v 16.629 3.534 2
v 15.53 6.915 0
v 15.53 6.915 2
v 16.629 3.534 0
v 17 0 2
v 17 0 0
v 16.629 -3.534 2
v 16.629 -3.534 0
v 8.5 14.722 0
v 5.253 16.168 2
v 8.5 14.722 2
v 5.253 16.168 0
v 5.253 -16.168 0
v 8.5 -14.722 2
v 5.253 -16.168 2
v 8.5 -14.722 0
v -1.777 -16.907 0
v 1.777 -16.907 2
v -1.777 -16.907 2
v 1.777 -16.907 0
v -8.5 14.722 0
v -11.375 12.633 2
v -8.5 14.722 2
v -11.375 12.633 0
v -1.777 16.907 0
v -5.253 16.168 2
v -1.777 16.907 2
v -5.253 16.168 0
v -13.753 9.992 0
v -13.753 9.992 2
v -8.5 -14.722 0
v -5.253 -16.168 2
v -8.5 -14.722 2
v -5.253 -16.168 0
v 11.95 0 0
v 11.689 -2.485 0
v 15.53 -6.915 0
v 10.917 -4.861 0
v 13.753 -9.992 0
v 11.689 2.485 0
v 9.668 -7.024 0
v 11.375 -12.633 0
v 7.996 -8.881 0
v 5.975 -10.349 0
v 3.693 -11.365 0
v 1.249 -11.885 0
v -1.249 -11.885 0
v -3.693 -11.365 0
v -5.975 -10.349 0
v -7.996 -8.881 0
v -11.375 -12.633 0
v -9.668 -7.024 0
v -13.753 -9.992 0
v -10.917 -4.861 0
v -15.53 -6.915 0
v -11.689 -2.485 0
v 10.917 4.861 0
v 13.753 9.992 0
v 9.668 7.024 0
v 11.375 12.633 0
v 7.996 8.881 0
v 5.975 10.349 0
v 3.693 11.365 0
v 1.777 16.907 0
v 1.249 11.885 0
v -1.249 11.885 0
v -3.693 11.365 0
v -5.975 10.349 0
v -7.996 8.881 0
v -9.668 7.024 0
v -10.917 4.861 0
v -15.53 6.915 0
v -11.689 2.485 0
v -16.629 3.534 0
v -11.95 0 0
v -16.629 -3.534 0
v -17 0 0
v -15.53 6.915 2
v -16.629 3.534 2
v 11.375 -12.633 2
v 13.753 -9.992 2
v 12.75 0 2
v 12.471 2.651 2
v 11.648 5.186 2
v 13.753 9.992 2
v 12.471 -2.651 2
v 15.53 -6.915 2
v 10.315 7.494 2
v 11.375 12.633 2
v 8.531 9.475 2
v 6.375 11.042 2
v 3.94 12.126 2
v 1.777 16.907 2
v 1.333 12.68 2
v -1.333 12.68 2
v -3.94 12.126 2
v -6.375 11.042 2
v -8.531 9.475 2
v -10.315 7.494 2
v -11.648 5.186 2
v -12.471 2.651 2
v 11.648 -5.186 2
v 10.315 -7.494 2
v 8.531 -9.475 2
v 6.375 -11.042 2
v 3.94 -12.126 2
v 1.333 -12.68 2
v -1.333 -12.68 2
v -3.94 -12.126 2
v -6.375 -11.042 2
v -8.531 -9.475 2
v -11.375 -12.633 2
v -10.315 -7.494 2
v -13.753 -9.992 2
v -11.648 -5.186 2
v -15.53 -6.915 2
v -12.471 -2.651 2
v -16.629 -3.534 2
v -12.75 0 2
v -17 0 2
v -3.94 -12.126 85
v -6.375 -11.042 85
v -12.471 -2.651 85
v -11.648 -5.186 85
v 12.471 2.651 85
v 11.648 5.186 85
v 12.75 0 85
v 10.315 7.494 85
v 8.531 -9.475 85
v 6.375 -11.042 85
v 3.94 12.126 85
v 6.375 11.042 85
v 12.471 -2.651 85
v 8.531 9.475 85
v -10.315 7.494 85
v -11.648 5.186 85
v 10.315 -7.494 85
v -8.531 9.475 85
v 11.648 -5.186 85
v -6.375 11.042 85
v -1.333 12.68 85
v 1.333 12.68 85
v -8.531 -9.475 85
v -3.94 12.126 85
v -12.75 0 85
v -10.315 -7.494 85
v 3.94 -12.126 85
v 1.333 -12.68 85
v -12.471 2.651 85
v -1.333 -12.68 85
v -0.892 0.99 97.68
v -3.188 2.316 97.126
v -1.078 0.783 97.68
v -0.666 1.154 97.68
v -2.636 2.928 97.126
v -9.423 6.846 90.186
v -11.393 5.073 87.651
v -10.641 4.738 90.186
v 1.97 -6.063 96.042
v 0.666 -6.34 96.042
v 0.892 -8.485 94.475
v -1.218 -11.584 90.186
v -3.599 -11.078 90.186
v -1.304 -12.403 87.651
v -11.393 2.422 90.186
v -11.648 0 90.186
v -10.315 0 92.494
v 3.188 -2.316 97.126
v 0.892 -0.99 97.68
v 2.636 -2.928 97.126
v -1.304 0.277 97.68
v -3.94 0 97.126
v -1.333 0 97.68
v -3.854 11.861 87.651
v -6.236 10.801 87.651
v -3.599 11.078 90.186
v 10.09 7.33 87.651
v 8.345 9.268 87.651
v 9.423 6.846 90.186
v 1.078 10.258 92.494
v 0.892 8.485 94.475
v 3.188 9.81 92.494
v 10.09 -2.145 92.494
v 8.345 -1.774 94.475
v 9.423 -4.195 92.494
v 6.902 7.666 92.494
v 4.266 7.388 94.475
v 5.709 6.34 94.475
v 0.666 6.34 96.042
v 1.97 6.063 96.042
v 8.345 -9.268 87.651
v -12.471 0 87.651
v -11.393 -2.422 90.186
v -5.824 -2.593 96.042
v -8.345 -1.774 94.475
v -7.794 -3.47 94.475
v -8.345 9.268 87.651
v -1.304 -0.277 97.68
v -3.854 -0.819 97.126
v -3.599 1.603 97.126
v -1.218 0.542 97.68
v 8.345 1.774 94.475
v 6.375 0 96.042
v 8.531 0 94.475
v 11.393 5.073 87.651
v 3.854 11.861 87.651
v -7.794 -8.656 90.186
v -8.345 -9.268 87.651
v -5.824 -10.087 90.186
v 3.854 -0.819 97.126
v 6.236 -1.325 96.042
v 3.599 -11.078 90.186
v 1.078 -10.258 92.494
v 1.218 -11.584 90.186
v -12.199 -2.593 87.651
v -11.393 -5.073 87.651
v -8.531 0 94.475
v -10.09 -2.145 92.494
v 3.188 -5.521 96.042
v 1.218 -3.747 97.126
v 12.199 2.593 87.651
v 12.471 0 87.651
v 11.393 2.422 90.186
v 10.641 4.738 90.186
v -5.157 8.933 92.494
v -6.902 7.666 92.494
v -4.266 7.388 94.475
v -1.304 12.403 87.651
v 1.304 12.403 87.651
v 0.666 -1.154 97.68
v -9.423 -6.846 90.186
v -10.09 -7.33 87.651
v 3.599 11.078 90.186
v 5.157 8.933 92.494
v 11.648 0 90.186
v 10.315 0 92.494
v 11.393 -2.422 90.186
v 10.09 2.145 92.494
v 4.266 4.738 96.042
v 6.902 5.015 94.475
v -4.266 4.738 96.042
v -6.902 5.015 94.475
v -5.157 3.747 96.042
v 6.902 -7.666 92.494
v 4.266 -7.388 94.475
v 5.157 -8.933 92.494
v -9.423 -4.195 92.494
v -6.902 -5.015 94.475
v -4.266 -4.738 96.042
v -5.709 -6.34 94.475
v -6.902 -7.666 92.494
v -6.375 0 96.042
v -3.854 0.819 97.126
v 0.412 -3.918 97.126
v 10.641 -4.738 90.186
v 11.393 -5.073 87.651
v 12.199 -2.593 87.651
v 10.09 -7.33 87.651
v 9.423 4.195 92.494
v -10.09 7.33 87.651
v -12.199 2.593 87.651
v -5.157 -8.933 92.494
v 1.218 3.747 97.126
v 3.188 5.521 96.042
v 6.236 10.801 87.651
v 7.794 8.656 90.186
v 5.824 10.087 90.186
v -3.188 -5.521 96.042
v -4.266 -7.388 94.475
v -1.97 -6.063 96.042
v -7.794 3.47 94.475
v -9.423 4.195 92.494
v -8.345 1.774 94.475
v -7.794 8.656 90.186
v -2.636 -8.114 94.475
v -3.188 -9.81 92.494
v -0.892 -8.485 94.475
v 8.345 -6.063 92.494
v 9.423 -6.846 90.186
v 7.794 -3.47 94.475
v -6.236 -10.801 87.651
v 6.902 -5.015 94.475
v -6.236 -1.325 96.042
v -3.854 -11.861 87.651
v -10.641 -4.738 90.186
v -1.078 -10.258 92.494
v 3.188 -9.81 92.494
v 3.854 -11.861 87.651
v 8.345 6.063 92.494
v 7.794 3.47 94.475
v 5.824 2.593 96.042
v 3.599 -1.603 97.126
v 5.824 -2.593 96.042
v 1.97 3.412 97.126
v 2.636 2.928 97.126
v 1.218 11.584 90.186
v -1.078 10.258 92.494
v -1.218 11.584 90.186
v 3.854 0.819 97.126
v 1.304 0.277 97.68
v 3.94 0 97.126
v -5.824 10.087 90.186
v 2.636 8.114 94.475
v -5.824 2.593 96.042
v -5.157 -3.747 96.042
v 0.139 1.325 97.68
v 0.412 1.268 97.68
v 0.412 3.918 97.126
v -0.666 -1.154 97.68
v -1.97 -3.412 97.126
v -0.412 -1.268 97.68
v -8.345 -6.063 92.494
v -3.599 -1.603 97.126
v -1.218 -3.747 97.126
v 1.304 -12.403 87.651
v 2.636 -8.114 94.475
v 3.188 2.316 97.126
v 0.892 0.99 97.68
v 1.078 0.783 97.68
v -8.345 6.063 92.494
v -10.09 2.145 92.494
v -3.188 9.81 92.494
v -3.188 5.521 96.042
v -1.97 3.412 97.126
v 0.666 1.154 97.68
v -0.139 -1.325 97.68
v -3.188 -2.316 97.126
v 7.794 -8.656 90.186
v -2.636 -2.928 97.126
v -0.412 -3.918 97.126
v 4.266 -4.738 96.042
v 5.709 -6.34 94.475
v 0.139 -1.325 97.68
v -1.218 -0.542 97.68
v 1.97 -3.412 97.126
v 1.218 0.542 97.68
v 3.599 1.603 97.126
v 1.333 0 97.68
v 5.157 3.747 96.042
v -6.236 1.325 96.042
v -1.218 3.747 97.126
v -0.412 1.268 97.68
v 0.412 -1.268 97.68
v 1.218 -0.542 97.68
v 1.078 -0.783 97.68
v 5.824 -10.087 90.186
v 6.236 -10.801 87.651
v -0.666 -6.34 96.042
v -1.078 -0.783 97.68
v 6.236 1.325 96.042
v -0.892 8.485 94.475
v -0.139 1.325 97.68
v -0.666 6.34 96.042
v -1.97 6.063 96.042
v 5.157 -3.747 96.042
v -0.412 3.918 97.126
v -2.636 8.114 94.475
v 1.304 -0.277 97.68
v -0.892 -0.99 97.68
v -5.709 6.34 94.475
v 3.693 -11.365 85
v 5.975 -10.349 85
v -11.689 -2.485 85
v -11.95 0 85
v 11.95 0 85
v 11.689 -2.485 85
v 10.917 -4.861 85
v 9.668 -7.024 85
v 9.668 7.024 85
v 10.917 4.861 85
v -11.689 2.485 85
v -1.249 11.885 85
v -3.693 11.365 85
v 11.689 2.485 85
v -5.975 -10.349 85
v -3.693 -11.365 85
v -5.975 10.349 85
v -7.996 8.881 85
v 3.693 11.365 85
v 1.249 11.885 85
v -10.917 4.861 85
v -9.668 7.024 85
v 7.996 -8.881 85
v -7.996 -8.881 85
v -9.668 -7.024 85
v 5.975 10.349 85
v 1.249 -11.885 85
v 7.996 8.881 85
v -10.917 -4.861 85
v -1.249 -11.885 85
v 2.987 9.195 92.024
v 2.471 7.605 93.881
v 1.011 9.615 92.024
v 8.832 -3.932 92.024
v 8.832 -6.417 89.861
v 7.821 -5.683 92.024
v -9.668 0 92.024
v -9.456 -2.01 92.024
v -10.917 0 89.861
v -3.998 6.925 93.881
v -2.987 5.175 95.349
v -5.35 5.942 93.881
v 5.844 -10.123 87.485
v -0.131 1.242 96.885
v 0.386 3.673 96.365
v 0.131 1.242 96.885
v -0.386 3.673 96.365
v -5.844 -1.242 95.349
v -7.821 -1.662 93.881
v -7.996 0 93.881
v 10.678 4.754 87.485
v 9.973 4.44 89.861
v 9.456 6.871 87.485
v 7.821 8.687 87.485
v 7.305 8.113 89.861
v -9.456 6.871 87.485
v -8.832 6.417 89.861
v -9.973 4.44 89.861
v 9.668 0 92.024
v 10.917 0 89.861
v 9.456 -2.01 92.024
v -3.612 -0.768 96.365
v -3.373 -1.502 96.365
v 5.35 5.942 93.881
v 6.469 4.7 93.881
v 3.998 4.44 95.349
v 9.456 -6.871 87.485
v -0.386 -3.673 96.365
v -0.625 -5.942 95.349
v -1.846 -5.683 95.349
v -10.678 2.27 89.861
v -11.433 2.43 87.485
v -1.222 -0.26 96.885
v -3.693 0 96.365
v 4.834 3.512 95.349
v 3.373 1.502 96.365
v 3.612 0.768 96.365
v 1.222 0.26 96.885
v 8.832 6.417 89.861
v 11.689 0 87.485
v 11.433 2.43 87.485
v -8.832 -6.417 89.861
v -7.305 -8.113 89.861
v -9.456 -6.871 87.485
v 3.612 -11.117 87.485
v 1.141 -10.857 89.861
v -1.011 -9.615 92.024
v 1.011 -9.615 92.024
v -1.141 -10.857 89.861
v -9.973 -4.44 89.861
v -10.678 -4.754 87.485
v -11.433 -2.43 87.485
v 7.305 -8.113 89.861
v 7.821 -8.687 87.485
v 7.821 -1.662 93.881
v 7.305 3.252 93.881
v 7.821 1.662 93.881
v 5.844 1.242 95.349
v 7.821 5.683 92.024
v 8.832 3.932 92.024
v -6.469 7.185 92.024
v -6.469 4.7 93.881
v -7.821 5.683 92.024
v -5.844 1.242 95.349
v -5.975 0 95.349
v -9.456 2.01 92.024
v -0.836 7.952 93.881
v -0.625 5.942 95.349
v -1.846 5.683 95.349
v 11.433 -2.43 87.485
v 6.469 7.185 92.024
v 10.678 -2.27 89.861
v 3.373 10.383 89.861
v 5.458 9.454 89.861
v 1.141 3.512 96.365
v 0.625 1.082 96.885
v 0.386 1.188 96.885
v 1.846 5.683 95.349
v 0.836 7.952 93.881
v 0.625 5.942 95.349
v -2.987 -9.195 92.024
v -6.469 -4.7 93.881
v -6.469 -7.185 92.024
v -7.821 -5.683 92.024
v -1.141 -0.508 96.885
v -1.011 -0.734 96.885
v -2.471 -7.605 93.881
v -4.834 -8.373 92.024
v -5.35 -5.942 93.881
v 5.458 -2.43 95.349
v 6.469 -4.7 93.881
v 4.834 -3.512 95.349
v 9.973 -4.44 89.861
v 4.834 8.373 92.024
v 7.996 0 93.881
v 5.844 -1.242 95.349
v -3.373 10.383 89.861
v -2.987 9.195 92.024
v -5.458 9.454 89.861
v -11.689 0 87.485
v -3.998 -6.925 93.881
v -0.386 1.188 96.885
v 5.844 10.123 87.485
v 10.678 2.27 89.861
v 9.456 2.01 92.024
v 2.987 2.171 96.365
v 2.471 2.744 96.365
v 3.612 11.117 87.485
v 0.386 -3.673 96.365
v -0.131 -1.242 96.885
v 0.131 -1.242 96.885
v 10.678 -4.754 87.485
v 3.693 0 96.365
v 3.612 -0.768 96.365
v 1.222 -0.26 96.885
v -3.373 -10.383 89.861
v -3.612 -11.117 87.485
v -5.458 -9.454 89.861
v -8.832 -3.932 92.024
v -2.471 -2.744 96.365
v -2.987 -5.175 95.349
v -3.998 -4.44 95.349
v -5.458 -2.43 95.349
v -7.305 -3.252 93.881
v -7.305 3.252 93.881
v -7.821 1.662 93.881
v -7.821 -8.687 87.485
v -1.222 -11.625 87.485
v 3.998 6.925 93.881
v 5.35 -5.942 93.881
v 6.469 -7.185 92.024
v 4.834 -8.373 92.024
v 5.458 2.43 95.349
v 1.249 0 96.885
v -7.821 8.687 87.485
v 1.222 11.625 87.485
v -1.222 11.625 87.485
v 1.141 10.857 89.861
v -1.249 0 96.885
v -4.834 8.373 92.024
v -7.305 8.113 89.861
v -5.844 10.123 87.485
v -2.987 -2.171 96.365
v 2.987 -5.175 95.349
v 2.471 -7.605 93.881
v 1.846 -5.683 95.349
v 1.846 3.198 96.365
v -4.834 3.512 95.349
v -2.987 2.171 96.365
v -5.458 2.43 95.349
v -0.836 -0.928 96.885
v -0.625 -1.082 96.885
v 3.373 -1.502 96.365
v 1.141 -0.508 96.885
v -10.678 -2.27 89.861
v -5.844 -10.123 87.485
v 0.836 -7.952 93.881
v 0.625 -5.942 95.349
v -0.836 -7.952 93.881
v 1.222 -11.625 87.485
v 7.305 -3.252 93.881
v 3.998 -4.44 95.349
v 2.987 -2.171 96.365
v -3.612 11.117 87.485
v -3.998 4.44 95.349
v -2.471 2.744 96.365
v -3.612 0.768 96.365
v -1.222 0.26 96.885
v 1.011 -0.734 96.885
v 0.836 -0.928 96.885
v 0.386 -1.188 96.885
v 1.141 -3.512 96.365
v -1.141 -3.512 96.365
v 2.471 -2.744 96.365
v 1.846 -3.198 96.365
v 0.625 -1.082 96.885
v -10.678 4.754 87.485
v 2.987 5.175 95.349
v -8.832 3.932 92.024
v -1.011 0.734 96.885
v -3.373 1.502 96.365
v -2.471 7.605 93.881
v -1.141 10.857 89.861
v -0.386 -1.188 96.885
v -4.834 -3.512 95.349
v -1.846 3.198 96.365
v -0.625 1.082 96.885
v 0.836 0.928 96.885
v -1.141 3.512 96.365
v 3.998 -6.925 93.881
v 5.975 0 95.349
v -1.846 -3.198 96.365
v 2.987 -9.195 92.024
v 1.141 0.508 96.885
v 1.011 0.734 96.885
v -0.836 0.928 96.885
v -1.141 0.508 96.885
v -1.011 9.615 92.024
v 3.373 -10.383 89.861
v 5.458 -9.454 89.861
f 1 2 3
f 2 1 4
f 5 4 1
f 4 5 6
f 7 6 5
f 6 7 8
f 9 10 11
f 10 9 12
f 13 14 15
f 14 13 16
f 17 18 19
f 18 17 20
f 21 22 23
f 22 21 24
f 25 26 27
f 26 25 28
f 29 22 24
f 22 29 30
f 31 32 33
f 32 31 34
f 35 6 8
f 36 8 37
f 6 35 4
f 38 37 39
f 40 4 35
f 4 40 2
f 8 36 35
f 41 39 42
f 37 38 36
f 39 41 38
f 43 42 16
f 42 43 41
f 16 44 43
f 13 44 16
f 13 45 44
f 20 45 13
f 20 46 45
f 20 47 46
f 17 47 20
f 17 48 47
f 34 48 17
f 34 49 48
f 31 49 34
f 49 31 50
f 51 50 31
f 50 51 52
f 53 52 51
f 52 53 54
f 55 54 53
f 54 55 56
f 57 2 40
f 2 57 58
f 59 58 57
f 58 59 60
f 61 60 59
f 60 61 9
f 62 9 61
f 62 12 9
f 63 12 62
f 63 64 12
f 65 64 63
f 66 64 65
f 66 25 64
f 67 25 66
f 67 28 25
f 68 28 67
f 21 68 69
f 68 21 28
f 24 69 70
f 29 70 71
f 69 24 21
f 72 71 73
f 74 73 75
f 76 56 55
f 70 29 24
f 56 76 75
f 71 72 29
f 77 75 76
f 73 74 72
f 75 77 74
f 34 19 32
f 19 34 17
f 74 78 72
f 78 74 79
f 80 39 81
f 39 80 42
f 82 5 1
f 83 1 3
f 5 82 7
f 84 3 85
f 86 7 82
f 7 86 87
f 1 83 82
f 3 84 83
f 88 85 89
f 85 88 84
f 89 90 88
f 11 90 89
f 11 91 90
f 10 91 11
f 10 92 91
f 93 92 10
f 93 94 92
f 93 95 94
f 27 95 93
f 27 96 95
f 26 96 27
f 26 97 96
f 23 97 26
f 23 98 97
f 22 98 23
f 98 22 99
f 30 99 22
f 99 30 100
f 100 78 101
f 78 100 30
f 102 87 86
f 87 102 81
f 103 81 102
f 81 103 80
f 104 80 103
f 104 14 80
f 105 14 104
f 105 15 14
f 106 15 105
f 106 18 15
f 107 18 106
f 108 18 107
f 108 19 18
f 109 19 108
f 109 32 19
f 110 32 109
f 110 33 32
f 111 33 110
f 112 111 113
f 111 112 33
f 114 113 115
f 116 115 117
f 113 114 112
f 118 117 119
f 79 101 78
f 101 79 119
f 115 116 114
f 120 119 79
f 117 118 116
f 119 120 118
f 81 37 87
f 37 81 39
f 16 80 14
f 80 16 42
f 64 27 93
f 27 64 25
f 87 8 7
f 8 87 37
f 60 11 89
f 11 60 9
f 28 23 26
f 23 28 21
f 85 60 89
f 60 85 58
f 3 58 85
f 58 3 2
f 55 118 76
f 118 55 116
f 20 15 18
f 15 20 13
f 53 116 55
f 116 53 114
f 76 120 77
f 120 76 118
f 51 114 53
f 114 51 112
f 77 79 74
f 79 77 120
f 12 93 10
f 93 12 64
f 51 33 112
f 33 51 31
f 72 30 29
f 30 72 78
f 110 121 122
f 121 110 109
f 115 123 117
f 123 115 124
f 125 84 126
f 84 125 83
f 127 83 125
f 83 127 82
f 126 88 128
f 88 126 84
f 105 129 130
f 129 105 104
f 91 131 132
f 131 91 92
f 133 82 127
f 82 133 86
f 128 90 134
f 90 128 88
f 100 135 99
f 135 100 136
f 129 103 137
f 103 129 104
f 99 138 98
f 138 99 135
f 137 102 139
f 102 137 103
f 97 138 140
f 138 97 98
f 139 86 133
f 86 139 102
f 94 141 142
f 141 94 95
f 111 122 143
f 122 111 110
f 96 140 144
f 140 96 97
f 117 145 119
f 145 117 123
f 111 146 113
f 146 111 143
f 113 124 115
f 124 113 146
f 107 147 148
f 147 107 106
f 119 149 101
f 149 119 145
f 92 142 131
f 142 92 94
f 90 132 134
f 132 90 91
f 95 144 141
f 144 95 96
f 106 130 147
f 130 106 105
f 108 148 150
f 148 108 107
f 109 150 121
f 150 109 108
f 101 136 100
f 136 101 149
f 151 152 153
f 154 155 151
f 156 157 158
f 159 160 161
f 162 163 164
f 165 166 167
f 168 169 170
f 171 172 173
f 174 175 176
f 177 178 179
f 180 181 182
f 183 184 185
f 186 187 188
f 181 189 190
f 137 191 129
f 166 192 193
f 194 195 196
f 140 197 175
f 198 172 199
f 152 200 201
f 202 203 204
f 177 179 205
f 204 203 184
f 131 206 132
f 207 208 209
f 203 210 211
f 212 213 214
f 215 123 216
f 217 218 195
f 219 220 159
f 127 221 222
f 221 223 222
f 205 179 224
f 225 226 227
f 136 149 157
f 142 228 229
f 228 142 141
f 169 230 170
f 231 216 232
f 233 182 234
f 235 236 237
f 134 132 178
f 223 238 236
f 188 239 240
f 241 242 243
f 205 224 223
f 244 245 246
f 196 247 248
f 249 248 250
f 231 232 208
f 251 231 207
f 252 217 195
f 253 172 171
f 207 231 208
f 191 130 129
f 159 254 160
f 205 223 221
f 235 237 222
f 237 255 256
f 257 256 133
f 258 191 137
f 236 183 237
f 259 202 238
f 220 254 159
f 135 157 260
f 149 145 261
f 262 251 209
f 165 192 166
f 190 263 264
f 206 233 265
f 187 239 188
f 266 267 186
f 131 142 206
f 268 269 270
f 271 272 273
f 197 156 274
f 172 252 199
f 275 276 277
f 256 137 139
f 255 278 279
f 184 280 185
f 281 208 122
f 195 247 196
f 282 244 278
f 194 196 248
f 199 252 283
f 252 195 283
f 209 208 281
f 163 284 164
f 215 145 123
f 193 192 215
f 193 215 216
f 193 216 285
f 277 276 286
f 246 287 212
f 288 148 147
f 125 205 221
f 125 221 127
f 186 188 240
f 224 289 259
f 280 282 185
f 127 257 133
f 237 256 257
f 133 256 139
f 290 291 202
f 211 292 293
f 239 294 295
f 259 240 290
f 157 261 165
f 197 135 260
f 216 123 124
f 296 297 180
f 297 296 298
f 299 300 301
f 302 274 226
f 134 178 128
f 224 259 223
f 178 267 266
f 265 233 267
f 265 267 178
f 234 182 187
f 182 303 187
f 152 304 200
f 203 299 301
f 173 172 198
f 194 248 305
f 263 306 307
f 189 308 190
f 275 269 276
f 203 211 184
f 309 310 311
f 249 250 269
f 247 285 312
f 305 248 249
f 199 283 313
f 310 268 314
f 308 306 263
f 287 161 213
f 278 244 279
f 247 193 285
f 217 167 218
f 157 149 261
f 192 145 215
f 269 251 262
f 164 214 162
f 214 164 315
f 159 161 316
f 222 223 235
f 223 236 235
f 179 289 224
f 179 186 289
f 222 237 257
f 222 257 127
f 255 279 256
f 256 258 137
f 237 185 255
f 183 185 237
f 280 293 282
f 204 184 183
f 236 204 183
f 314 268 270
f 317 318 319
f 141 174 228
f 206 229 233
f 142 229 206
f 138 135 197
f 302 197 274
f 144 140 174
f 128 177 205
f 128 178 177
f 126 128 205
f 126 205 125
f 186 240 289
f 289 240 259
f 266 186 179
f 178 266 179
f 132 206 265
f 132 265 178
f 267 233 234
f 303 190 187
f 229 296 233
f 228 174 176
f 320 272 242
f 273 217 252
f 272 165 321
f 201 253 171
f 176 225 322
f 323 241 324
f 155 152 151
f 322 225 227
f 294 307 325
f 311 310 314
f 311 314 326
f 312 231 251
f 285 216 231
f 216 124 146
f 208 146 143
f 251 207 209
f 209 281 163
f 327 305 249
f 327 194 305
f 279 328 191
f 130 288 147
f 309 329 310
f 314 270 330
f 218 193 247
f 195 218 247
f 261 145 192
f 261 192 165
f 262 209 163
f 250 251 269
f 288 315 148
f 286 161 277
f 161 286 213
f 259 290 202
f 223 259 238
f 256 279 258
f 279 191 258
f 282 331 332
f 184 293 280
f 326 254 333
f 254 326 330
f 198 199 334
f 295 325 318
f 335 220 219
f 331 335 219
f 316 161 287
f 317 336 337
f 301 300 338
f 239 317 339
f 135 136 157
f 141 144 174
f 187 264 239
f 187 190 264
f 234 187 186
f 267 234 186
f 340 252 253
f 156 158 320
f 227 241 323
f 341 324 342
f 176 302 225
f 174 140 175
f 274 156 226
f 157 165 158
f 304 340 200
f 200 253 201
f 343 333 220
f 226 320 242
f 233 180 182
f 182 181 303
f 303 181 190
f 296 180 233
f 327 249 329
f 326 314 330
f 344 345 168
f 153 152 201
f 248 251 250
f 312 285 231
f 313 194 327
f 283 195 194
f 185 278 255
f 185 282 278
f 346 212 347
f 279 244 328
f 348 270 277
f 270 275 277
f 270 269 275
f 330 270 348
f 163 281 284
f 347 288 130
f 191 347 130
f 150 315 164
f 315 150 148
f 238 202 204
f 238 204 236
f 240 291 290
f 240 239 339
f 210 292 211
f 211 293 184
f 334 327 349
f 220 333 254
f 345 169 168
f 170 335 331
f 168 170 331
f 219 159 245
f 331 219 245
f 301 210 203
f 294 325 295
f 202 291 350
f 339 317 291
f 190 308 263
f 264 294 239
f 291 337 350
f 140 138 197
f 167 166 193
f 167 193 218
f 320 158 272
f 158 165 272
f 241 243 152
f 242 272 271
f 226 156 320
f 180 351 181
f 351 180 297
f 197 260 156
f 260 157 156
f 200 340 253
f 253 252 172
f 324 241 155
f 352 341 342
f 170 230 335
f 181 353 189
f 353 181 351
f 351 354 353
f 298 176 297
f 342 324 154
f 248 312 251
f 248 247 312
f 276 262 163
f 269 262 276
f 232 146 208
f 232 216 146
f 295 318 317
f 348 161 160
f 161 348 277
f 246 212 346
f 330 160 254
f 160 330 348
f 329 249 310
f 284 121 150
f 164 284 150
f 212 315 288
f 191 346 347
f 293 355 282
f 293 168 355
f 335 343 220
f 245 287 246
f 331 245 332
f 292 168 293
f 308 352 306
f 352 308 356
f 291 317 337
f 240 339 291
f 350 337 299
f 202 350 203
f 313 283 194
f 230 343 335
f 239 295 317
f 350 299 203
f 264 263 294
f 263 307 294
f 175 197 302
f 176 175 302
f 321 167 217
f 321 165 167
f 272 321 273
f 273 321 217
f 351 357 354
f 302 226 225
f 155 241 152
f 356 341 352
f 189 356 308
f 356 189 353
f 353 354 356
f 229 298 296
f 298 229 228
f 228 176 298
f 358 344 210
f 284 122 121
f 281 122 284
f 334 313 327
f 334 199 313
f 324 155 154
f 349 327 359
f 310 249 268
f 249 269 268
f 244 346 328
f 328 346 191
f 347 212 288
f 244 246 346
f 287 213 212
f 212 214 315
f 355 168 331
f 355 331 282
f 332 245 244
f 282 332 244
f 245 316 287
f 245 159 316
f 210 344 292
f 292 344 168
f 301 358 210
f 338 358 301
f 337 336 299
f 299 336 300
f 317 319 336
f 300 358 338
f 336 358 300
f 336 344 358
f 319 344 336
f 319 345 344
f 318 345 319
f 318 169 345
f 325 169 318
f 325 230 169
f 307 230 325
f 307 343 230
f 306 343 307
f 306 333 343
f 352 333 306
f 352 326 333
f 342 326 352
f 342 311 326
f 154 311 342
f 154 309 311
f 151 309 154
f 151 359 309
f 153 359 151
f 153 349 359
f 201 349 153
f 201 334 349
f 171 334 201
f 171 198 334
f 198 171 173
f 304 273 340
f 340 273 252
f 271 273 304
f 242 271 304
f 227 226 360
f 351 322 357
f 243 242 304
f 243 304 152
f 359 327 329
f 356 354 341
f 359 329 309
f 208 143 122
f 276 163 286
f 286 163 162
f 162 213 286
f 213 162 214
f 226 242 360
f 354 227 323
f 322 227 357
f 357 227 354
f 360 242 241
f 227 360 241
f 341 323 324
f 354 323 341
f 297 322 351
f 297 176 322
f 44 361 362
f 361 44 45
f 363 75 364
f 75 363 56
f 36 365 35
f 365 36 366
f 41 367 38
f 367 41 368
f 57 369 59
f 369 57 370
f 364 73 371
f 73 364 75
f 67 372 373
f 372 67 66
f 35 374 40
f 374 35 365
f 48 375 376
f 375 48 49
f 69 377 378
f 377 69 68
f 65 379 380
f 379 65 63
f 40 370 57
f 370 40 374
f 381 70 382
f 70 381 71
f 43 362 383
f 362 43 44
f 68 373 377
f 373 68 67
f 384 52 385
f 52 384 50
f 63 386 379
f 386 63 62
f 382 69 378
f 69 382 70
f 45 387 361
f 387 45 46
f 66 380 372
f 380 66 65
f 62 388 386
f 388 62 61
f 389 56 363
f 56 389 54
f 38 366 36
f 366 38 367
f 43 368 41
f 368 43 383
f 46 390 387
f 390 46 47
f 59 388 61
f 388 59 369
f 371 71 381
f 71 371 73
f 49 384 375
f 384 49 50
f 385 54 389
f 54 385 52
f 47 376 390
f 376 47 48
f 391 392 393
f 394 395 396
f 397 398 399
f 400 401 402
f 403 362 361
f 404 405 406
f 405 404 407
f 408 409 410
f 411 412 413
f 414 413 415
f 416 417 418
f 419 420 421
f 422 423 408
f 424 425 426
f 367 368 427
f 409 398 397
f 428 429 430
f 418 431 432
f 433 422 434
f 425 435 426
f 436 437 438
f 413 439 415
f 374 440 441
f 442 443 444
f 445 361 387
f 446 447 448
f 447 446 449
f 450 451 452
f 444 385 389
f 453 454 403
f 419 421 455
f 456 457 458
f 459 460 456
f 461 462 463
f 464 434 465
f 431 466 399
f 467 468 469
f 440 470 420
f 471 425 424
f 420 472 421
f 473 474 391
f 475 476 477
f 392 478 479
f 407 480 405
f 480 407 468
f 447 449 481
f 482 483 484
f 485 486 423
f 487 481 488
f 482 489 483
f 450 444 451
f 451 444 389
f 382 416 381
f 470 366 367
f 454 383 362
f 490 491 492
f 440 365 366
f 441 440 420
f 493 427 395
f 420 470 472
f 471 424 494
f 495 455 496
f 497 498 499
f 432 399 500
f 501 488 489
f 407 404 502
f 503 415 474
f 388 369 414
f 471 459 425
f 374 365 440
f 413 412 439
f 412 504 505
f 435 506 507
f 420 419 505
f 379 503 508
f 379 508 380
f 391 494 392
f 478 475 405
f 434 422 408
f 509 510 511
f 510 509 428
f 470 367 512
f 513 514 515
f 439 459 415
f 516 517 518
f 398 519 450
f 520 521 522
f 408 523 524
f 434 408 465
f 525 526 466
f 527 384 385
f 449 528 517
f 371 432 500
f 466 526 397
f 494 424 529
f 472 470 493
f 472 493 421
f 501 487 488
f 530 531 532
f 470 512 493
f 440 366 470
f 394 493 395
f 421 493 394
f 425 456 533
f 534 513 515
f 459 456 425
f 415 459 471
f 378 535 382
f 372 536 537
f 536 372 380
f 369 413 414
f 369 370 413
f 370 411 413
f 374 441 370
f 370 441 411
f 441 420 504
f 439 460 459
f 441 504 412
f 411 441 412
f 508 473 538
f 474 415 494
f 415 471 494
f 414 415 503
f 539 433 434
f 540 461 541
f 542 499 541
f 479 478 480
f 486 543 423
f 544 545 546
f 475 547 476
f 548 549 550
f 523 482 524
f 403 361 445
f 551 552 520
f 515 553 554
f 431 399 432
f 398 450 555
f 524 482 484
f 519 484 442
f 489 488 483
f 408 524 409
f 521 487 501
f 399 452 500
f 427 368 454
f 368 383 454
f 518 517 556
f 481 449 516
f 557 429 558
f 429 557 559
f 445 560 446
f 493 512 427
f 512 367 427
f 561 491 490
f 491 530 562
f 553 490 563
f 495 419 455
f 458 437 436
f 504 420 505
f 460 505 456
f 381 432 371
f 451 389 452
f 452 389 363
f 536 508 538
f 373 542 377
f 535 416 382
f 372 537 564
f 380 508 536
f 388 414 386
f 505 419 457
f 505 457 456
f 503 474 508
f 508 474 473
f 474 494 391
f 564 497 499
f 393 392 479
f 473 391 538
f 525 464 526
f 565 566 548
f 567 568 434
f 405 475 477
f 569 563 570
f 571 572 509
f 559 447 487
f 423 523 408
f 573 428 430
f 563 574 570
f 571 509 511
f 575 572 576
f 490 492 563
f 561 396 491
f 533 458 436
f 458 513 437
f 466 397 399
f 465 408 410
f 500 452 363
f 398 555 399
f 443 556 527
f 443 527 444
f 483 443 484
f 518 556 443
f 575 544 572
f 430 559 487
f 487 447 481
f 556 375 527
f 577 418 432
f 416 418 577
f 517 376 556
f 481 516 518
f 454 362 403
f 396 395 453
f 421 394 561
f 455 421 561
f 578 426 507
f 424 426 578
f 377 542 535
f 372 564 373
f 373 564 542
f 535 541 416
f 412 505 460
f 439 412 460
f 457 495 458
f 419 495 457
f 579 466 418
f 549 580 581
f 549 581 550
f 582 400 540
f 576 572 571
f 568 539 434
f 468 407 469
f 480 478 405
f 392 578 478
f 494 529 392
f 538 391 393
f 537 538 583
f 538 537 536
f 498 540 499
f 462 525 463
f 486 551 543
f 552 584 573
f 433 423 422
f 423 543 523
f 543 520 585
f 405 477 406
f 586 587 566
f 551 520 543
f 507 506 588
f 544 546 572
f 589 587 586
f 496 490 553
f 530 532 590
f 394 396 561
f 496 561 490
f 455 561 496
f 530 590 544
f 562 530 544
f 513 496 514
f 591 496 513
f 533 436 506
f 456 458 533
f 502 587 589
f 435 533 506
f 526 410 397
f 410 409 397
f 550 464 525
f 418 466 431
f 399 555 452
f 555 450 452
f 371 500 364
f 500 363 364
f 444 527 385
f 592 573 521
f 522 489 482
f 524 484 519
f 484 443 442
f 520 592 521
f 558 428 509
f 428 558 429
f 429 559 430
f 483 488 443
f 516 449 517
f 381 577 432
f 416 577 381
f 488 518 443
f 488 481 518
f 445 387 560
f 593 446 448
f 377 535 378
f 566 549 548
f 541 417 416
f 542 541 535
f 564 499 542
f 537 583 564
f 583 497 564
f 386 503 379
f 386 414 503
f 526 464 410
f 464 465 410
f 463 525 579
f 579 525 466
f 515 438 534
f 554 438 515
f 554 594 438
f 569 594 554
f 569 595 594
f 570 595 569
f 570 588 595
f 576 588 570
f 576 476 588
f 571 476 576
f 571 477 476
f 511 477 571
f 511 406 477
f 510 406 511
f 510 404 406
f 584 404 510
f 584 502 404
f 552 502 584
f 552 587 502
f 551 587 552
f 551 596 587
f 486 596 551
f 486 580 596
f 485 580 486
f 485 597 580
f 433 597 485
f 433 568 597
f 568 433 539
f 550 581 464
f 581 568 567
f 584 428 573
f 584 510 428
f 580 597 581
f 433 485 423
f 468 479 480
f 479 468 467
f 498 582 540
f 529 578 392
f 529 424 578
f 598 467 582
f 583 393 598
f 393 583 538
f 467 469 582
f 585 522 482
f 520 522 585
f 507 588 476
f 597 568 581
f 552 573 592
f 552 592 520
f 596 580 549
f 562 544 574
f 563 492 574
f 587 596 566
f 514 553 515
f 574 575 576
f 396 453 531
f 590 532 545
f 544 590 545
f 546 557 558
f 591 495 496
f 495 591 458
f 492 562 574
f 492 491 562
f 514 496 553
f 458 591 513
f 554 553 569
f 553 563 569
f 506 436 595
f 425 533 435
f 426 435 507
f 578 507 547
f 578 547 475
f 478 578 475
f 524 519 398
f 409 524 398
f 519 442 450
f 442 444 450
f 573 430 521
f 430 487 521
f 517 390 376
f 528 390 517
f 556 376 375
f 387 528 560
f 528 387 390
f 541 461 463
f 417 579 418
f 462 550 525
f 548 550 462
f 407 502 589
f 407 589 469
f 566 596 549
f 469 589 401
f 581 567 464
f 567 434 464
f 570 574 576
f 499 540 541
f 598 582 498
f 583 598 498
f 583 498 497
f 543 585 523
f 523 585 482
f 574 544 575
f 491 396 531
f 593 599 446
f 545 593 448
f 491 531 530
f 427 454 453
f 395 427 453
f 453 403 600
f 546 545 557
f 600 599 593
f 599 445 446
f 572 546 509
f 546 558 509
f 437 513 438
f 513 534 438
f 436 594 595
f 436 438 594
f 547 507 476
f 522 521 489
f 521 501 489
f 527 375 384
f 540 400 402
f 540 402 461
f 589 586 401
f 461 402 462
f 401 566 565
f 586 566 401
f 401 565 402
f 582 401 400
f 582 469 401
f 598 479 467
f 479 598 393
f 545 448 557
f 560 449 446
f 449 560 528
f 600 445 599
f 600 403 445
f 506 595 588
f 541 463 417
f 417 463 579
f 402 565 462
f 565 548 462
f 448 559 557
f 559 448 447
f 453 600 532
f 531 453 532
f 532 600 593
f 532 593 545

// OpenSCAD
difference(){
    union(){
cylinder(2,d1=34,d2=34);
cylinder(85,d1=25.5,d2=25.5);
translate([0,0,85])sphere(25.5/2);
    }
cylinder(85,d1=25.5-1.6,d2=25.5-1.6);
translate([0,0,85])sphere((25.5-1.6)/2);
}
